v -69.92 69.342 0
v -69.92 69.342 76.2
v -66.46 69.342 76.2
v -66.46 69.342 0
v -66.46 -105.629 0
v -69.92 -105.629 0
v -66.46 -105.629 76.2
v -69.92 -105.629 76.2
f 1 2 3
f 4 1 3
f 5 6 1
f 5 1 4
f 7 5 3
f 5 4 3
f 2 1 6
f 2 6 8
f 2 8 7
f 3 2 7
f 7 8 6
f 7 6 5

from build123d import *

# Parameters (mm, degrees)
F0_W     = 54.2596559972
F0_H     = 98.770968616
F1_DEPTH = 76.2
F2_DEPTH = 25.4
F3_DEPTH = 25.4
F4_DEPTH = 76.2


with BuildPart() as f1:
    # F0 (on Top) → F1 (new body)
    with BuildSketch(Plane.XY):
        with Locations((-42.7902424708, 19.9565179646)):
            Rectangle(F0_W, F0_H)
    extrude(amount=F1_DEPTH)

    # F2 (cut): a face of the model
    f2_faces = [f1.faces().sort_by_distance(p)[0] for p in [
        (-15.6604144722, 19.9565179646, 38.1),
    ]]
    extrude(f2_faces, amount=-F2_DEPTH, mode=Mode.SUBTRACT)

    # F3 (cut): a face of the model
    f3_faces = [f1.faces().sort_by_distance(p)[0] for p in [
        (-41.0604144722, 19.9565179646, 38.1),
    ]]
    extrude(f3_faces, amount=-F3_DEPTH, mode=Mode.SUBTRACT)

    # F4 (add): a face of the model
    f4_faces = [f1.faces().sort_by_distance(p)[0] for p in [
        (-68.1902424708, -29.4289663434, 38.1),
    ]]
    extrude(f4_faces, amount=F4_DEPTH)


solid = f1.part
